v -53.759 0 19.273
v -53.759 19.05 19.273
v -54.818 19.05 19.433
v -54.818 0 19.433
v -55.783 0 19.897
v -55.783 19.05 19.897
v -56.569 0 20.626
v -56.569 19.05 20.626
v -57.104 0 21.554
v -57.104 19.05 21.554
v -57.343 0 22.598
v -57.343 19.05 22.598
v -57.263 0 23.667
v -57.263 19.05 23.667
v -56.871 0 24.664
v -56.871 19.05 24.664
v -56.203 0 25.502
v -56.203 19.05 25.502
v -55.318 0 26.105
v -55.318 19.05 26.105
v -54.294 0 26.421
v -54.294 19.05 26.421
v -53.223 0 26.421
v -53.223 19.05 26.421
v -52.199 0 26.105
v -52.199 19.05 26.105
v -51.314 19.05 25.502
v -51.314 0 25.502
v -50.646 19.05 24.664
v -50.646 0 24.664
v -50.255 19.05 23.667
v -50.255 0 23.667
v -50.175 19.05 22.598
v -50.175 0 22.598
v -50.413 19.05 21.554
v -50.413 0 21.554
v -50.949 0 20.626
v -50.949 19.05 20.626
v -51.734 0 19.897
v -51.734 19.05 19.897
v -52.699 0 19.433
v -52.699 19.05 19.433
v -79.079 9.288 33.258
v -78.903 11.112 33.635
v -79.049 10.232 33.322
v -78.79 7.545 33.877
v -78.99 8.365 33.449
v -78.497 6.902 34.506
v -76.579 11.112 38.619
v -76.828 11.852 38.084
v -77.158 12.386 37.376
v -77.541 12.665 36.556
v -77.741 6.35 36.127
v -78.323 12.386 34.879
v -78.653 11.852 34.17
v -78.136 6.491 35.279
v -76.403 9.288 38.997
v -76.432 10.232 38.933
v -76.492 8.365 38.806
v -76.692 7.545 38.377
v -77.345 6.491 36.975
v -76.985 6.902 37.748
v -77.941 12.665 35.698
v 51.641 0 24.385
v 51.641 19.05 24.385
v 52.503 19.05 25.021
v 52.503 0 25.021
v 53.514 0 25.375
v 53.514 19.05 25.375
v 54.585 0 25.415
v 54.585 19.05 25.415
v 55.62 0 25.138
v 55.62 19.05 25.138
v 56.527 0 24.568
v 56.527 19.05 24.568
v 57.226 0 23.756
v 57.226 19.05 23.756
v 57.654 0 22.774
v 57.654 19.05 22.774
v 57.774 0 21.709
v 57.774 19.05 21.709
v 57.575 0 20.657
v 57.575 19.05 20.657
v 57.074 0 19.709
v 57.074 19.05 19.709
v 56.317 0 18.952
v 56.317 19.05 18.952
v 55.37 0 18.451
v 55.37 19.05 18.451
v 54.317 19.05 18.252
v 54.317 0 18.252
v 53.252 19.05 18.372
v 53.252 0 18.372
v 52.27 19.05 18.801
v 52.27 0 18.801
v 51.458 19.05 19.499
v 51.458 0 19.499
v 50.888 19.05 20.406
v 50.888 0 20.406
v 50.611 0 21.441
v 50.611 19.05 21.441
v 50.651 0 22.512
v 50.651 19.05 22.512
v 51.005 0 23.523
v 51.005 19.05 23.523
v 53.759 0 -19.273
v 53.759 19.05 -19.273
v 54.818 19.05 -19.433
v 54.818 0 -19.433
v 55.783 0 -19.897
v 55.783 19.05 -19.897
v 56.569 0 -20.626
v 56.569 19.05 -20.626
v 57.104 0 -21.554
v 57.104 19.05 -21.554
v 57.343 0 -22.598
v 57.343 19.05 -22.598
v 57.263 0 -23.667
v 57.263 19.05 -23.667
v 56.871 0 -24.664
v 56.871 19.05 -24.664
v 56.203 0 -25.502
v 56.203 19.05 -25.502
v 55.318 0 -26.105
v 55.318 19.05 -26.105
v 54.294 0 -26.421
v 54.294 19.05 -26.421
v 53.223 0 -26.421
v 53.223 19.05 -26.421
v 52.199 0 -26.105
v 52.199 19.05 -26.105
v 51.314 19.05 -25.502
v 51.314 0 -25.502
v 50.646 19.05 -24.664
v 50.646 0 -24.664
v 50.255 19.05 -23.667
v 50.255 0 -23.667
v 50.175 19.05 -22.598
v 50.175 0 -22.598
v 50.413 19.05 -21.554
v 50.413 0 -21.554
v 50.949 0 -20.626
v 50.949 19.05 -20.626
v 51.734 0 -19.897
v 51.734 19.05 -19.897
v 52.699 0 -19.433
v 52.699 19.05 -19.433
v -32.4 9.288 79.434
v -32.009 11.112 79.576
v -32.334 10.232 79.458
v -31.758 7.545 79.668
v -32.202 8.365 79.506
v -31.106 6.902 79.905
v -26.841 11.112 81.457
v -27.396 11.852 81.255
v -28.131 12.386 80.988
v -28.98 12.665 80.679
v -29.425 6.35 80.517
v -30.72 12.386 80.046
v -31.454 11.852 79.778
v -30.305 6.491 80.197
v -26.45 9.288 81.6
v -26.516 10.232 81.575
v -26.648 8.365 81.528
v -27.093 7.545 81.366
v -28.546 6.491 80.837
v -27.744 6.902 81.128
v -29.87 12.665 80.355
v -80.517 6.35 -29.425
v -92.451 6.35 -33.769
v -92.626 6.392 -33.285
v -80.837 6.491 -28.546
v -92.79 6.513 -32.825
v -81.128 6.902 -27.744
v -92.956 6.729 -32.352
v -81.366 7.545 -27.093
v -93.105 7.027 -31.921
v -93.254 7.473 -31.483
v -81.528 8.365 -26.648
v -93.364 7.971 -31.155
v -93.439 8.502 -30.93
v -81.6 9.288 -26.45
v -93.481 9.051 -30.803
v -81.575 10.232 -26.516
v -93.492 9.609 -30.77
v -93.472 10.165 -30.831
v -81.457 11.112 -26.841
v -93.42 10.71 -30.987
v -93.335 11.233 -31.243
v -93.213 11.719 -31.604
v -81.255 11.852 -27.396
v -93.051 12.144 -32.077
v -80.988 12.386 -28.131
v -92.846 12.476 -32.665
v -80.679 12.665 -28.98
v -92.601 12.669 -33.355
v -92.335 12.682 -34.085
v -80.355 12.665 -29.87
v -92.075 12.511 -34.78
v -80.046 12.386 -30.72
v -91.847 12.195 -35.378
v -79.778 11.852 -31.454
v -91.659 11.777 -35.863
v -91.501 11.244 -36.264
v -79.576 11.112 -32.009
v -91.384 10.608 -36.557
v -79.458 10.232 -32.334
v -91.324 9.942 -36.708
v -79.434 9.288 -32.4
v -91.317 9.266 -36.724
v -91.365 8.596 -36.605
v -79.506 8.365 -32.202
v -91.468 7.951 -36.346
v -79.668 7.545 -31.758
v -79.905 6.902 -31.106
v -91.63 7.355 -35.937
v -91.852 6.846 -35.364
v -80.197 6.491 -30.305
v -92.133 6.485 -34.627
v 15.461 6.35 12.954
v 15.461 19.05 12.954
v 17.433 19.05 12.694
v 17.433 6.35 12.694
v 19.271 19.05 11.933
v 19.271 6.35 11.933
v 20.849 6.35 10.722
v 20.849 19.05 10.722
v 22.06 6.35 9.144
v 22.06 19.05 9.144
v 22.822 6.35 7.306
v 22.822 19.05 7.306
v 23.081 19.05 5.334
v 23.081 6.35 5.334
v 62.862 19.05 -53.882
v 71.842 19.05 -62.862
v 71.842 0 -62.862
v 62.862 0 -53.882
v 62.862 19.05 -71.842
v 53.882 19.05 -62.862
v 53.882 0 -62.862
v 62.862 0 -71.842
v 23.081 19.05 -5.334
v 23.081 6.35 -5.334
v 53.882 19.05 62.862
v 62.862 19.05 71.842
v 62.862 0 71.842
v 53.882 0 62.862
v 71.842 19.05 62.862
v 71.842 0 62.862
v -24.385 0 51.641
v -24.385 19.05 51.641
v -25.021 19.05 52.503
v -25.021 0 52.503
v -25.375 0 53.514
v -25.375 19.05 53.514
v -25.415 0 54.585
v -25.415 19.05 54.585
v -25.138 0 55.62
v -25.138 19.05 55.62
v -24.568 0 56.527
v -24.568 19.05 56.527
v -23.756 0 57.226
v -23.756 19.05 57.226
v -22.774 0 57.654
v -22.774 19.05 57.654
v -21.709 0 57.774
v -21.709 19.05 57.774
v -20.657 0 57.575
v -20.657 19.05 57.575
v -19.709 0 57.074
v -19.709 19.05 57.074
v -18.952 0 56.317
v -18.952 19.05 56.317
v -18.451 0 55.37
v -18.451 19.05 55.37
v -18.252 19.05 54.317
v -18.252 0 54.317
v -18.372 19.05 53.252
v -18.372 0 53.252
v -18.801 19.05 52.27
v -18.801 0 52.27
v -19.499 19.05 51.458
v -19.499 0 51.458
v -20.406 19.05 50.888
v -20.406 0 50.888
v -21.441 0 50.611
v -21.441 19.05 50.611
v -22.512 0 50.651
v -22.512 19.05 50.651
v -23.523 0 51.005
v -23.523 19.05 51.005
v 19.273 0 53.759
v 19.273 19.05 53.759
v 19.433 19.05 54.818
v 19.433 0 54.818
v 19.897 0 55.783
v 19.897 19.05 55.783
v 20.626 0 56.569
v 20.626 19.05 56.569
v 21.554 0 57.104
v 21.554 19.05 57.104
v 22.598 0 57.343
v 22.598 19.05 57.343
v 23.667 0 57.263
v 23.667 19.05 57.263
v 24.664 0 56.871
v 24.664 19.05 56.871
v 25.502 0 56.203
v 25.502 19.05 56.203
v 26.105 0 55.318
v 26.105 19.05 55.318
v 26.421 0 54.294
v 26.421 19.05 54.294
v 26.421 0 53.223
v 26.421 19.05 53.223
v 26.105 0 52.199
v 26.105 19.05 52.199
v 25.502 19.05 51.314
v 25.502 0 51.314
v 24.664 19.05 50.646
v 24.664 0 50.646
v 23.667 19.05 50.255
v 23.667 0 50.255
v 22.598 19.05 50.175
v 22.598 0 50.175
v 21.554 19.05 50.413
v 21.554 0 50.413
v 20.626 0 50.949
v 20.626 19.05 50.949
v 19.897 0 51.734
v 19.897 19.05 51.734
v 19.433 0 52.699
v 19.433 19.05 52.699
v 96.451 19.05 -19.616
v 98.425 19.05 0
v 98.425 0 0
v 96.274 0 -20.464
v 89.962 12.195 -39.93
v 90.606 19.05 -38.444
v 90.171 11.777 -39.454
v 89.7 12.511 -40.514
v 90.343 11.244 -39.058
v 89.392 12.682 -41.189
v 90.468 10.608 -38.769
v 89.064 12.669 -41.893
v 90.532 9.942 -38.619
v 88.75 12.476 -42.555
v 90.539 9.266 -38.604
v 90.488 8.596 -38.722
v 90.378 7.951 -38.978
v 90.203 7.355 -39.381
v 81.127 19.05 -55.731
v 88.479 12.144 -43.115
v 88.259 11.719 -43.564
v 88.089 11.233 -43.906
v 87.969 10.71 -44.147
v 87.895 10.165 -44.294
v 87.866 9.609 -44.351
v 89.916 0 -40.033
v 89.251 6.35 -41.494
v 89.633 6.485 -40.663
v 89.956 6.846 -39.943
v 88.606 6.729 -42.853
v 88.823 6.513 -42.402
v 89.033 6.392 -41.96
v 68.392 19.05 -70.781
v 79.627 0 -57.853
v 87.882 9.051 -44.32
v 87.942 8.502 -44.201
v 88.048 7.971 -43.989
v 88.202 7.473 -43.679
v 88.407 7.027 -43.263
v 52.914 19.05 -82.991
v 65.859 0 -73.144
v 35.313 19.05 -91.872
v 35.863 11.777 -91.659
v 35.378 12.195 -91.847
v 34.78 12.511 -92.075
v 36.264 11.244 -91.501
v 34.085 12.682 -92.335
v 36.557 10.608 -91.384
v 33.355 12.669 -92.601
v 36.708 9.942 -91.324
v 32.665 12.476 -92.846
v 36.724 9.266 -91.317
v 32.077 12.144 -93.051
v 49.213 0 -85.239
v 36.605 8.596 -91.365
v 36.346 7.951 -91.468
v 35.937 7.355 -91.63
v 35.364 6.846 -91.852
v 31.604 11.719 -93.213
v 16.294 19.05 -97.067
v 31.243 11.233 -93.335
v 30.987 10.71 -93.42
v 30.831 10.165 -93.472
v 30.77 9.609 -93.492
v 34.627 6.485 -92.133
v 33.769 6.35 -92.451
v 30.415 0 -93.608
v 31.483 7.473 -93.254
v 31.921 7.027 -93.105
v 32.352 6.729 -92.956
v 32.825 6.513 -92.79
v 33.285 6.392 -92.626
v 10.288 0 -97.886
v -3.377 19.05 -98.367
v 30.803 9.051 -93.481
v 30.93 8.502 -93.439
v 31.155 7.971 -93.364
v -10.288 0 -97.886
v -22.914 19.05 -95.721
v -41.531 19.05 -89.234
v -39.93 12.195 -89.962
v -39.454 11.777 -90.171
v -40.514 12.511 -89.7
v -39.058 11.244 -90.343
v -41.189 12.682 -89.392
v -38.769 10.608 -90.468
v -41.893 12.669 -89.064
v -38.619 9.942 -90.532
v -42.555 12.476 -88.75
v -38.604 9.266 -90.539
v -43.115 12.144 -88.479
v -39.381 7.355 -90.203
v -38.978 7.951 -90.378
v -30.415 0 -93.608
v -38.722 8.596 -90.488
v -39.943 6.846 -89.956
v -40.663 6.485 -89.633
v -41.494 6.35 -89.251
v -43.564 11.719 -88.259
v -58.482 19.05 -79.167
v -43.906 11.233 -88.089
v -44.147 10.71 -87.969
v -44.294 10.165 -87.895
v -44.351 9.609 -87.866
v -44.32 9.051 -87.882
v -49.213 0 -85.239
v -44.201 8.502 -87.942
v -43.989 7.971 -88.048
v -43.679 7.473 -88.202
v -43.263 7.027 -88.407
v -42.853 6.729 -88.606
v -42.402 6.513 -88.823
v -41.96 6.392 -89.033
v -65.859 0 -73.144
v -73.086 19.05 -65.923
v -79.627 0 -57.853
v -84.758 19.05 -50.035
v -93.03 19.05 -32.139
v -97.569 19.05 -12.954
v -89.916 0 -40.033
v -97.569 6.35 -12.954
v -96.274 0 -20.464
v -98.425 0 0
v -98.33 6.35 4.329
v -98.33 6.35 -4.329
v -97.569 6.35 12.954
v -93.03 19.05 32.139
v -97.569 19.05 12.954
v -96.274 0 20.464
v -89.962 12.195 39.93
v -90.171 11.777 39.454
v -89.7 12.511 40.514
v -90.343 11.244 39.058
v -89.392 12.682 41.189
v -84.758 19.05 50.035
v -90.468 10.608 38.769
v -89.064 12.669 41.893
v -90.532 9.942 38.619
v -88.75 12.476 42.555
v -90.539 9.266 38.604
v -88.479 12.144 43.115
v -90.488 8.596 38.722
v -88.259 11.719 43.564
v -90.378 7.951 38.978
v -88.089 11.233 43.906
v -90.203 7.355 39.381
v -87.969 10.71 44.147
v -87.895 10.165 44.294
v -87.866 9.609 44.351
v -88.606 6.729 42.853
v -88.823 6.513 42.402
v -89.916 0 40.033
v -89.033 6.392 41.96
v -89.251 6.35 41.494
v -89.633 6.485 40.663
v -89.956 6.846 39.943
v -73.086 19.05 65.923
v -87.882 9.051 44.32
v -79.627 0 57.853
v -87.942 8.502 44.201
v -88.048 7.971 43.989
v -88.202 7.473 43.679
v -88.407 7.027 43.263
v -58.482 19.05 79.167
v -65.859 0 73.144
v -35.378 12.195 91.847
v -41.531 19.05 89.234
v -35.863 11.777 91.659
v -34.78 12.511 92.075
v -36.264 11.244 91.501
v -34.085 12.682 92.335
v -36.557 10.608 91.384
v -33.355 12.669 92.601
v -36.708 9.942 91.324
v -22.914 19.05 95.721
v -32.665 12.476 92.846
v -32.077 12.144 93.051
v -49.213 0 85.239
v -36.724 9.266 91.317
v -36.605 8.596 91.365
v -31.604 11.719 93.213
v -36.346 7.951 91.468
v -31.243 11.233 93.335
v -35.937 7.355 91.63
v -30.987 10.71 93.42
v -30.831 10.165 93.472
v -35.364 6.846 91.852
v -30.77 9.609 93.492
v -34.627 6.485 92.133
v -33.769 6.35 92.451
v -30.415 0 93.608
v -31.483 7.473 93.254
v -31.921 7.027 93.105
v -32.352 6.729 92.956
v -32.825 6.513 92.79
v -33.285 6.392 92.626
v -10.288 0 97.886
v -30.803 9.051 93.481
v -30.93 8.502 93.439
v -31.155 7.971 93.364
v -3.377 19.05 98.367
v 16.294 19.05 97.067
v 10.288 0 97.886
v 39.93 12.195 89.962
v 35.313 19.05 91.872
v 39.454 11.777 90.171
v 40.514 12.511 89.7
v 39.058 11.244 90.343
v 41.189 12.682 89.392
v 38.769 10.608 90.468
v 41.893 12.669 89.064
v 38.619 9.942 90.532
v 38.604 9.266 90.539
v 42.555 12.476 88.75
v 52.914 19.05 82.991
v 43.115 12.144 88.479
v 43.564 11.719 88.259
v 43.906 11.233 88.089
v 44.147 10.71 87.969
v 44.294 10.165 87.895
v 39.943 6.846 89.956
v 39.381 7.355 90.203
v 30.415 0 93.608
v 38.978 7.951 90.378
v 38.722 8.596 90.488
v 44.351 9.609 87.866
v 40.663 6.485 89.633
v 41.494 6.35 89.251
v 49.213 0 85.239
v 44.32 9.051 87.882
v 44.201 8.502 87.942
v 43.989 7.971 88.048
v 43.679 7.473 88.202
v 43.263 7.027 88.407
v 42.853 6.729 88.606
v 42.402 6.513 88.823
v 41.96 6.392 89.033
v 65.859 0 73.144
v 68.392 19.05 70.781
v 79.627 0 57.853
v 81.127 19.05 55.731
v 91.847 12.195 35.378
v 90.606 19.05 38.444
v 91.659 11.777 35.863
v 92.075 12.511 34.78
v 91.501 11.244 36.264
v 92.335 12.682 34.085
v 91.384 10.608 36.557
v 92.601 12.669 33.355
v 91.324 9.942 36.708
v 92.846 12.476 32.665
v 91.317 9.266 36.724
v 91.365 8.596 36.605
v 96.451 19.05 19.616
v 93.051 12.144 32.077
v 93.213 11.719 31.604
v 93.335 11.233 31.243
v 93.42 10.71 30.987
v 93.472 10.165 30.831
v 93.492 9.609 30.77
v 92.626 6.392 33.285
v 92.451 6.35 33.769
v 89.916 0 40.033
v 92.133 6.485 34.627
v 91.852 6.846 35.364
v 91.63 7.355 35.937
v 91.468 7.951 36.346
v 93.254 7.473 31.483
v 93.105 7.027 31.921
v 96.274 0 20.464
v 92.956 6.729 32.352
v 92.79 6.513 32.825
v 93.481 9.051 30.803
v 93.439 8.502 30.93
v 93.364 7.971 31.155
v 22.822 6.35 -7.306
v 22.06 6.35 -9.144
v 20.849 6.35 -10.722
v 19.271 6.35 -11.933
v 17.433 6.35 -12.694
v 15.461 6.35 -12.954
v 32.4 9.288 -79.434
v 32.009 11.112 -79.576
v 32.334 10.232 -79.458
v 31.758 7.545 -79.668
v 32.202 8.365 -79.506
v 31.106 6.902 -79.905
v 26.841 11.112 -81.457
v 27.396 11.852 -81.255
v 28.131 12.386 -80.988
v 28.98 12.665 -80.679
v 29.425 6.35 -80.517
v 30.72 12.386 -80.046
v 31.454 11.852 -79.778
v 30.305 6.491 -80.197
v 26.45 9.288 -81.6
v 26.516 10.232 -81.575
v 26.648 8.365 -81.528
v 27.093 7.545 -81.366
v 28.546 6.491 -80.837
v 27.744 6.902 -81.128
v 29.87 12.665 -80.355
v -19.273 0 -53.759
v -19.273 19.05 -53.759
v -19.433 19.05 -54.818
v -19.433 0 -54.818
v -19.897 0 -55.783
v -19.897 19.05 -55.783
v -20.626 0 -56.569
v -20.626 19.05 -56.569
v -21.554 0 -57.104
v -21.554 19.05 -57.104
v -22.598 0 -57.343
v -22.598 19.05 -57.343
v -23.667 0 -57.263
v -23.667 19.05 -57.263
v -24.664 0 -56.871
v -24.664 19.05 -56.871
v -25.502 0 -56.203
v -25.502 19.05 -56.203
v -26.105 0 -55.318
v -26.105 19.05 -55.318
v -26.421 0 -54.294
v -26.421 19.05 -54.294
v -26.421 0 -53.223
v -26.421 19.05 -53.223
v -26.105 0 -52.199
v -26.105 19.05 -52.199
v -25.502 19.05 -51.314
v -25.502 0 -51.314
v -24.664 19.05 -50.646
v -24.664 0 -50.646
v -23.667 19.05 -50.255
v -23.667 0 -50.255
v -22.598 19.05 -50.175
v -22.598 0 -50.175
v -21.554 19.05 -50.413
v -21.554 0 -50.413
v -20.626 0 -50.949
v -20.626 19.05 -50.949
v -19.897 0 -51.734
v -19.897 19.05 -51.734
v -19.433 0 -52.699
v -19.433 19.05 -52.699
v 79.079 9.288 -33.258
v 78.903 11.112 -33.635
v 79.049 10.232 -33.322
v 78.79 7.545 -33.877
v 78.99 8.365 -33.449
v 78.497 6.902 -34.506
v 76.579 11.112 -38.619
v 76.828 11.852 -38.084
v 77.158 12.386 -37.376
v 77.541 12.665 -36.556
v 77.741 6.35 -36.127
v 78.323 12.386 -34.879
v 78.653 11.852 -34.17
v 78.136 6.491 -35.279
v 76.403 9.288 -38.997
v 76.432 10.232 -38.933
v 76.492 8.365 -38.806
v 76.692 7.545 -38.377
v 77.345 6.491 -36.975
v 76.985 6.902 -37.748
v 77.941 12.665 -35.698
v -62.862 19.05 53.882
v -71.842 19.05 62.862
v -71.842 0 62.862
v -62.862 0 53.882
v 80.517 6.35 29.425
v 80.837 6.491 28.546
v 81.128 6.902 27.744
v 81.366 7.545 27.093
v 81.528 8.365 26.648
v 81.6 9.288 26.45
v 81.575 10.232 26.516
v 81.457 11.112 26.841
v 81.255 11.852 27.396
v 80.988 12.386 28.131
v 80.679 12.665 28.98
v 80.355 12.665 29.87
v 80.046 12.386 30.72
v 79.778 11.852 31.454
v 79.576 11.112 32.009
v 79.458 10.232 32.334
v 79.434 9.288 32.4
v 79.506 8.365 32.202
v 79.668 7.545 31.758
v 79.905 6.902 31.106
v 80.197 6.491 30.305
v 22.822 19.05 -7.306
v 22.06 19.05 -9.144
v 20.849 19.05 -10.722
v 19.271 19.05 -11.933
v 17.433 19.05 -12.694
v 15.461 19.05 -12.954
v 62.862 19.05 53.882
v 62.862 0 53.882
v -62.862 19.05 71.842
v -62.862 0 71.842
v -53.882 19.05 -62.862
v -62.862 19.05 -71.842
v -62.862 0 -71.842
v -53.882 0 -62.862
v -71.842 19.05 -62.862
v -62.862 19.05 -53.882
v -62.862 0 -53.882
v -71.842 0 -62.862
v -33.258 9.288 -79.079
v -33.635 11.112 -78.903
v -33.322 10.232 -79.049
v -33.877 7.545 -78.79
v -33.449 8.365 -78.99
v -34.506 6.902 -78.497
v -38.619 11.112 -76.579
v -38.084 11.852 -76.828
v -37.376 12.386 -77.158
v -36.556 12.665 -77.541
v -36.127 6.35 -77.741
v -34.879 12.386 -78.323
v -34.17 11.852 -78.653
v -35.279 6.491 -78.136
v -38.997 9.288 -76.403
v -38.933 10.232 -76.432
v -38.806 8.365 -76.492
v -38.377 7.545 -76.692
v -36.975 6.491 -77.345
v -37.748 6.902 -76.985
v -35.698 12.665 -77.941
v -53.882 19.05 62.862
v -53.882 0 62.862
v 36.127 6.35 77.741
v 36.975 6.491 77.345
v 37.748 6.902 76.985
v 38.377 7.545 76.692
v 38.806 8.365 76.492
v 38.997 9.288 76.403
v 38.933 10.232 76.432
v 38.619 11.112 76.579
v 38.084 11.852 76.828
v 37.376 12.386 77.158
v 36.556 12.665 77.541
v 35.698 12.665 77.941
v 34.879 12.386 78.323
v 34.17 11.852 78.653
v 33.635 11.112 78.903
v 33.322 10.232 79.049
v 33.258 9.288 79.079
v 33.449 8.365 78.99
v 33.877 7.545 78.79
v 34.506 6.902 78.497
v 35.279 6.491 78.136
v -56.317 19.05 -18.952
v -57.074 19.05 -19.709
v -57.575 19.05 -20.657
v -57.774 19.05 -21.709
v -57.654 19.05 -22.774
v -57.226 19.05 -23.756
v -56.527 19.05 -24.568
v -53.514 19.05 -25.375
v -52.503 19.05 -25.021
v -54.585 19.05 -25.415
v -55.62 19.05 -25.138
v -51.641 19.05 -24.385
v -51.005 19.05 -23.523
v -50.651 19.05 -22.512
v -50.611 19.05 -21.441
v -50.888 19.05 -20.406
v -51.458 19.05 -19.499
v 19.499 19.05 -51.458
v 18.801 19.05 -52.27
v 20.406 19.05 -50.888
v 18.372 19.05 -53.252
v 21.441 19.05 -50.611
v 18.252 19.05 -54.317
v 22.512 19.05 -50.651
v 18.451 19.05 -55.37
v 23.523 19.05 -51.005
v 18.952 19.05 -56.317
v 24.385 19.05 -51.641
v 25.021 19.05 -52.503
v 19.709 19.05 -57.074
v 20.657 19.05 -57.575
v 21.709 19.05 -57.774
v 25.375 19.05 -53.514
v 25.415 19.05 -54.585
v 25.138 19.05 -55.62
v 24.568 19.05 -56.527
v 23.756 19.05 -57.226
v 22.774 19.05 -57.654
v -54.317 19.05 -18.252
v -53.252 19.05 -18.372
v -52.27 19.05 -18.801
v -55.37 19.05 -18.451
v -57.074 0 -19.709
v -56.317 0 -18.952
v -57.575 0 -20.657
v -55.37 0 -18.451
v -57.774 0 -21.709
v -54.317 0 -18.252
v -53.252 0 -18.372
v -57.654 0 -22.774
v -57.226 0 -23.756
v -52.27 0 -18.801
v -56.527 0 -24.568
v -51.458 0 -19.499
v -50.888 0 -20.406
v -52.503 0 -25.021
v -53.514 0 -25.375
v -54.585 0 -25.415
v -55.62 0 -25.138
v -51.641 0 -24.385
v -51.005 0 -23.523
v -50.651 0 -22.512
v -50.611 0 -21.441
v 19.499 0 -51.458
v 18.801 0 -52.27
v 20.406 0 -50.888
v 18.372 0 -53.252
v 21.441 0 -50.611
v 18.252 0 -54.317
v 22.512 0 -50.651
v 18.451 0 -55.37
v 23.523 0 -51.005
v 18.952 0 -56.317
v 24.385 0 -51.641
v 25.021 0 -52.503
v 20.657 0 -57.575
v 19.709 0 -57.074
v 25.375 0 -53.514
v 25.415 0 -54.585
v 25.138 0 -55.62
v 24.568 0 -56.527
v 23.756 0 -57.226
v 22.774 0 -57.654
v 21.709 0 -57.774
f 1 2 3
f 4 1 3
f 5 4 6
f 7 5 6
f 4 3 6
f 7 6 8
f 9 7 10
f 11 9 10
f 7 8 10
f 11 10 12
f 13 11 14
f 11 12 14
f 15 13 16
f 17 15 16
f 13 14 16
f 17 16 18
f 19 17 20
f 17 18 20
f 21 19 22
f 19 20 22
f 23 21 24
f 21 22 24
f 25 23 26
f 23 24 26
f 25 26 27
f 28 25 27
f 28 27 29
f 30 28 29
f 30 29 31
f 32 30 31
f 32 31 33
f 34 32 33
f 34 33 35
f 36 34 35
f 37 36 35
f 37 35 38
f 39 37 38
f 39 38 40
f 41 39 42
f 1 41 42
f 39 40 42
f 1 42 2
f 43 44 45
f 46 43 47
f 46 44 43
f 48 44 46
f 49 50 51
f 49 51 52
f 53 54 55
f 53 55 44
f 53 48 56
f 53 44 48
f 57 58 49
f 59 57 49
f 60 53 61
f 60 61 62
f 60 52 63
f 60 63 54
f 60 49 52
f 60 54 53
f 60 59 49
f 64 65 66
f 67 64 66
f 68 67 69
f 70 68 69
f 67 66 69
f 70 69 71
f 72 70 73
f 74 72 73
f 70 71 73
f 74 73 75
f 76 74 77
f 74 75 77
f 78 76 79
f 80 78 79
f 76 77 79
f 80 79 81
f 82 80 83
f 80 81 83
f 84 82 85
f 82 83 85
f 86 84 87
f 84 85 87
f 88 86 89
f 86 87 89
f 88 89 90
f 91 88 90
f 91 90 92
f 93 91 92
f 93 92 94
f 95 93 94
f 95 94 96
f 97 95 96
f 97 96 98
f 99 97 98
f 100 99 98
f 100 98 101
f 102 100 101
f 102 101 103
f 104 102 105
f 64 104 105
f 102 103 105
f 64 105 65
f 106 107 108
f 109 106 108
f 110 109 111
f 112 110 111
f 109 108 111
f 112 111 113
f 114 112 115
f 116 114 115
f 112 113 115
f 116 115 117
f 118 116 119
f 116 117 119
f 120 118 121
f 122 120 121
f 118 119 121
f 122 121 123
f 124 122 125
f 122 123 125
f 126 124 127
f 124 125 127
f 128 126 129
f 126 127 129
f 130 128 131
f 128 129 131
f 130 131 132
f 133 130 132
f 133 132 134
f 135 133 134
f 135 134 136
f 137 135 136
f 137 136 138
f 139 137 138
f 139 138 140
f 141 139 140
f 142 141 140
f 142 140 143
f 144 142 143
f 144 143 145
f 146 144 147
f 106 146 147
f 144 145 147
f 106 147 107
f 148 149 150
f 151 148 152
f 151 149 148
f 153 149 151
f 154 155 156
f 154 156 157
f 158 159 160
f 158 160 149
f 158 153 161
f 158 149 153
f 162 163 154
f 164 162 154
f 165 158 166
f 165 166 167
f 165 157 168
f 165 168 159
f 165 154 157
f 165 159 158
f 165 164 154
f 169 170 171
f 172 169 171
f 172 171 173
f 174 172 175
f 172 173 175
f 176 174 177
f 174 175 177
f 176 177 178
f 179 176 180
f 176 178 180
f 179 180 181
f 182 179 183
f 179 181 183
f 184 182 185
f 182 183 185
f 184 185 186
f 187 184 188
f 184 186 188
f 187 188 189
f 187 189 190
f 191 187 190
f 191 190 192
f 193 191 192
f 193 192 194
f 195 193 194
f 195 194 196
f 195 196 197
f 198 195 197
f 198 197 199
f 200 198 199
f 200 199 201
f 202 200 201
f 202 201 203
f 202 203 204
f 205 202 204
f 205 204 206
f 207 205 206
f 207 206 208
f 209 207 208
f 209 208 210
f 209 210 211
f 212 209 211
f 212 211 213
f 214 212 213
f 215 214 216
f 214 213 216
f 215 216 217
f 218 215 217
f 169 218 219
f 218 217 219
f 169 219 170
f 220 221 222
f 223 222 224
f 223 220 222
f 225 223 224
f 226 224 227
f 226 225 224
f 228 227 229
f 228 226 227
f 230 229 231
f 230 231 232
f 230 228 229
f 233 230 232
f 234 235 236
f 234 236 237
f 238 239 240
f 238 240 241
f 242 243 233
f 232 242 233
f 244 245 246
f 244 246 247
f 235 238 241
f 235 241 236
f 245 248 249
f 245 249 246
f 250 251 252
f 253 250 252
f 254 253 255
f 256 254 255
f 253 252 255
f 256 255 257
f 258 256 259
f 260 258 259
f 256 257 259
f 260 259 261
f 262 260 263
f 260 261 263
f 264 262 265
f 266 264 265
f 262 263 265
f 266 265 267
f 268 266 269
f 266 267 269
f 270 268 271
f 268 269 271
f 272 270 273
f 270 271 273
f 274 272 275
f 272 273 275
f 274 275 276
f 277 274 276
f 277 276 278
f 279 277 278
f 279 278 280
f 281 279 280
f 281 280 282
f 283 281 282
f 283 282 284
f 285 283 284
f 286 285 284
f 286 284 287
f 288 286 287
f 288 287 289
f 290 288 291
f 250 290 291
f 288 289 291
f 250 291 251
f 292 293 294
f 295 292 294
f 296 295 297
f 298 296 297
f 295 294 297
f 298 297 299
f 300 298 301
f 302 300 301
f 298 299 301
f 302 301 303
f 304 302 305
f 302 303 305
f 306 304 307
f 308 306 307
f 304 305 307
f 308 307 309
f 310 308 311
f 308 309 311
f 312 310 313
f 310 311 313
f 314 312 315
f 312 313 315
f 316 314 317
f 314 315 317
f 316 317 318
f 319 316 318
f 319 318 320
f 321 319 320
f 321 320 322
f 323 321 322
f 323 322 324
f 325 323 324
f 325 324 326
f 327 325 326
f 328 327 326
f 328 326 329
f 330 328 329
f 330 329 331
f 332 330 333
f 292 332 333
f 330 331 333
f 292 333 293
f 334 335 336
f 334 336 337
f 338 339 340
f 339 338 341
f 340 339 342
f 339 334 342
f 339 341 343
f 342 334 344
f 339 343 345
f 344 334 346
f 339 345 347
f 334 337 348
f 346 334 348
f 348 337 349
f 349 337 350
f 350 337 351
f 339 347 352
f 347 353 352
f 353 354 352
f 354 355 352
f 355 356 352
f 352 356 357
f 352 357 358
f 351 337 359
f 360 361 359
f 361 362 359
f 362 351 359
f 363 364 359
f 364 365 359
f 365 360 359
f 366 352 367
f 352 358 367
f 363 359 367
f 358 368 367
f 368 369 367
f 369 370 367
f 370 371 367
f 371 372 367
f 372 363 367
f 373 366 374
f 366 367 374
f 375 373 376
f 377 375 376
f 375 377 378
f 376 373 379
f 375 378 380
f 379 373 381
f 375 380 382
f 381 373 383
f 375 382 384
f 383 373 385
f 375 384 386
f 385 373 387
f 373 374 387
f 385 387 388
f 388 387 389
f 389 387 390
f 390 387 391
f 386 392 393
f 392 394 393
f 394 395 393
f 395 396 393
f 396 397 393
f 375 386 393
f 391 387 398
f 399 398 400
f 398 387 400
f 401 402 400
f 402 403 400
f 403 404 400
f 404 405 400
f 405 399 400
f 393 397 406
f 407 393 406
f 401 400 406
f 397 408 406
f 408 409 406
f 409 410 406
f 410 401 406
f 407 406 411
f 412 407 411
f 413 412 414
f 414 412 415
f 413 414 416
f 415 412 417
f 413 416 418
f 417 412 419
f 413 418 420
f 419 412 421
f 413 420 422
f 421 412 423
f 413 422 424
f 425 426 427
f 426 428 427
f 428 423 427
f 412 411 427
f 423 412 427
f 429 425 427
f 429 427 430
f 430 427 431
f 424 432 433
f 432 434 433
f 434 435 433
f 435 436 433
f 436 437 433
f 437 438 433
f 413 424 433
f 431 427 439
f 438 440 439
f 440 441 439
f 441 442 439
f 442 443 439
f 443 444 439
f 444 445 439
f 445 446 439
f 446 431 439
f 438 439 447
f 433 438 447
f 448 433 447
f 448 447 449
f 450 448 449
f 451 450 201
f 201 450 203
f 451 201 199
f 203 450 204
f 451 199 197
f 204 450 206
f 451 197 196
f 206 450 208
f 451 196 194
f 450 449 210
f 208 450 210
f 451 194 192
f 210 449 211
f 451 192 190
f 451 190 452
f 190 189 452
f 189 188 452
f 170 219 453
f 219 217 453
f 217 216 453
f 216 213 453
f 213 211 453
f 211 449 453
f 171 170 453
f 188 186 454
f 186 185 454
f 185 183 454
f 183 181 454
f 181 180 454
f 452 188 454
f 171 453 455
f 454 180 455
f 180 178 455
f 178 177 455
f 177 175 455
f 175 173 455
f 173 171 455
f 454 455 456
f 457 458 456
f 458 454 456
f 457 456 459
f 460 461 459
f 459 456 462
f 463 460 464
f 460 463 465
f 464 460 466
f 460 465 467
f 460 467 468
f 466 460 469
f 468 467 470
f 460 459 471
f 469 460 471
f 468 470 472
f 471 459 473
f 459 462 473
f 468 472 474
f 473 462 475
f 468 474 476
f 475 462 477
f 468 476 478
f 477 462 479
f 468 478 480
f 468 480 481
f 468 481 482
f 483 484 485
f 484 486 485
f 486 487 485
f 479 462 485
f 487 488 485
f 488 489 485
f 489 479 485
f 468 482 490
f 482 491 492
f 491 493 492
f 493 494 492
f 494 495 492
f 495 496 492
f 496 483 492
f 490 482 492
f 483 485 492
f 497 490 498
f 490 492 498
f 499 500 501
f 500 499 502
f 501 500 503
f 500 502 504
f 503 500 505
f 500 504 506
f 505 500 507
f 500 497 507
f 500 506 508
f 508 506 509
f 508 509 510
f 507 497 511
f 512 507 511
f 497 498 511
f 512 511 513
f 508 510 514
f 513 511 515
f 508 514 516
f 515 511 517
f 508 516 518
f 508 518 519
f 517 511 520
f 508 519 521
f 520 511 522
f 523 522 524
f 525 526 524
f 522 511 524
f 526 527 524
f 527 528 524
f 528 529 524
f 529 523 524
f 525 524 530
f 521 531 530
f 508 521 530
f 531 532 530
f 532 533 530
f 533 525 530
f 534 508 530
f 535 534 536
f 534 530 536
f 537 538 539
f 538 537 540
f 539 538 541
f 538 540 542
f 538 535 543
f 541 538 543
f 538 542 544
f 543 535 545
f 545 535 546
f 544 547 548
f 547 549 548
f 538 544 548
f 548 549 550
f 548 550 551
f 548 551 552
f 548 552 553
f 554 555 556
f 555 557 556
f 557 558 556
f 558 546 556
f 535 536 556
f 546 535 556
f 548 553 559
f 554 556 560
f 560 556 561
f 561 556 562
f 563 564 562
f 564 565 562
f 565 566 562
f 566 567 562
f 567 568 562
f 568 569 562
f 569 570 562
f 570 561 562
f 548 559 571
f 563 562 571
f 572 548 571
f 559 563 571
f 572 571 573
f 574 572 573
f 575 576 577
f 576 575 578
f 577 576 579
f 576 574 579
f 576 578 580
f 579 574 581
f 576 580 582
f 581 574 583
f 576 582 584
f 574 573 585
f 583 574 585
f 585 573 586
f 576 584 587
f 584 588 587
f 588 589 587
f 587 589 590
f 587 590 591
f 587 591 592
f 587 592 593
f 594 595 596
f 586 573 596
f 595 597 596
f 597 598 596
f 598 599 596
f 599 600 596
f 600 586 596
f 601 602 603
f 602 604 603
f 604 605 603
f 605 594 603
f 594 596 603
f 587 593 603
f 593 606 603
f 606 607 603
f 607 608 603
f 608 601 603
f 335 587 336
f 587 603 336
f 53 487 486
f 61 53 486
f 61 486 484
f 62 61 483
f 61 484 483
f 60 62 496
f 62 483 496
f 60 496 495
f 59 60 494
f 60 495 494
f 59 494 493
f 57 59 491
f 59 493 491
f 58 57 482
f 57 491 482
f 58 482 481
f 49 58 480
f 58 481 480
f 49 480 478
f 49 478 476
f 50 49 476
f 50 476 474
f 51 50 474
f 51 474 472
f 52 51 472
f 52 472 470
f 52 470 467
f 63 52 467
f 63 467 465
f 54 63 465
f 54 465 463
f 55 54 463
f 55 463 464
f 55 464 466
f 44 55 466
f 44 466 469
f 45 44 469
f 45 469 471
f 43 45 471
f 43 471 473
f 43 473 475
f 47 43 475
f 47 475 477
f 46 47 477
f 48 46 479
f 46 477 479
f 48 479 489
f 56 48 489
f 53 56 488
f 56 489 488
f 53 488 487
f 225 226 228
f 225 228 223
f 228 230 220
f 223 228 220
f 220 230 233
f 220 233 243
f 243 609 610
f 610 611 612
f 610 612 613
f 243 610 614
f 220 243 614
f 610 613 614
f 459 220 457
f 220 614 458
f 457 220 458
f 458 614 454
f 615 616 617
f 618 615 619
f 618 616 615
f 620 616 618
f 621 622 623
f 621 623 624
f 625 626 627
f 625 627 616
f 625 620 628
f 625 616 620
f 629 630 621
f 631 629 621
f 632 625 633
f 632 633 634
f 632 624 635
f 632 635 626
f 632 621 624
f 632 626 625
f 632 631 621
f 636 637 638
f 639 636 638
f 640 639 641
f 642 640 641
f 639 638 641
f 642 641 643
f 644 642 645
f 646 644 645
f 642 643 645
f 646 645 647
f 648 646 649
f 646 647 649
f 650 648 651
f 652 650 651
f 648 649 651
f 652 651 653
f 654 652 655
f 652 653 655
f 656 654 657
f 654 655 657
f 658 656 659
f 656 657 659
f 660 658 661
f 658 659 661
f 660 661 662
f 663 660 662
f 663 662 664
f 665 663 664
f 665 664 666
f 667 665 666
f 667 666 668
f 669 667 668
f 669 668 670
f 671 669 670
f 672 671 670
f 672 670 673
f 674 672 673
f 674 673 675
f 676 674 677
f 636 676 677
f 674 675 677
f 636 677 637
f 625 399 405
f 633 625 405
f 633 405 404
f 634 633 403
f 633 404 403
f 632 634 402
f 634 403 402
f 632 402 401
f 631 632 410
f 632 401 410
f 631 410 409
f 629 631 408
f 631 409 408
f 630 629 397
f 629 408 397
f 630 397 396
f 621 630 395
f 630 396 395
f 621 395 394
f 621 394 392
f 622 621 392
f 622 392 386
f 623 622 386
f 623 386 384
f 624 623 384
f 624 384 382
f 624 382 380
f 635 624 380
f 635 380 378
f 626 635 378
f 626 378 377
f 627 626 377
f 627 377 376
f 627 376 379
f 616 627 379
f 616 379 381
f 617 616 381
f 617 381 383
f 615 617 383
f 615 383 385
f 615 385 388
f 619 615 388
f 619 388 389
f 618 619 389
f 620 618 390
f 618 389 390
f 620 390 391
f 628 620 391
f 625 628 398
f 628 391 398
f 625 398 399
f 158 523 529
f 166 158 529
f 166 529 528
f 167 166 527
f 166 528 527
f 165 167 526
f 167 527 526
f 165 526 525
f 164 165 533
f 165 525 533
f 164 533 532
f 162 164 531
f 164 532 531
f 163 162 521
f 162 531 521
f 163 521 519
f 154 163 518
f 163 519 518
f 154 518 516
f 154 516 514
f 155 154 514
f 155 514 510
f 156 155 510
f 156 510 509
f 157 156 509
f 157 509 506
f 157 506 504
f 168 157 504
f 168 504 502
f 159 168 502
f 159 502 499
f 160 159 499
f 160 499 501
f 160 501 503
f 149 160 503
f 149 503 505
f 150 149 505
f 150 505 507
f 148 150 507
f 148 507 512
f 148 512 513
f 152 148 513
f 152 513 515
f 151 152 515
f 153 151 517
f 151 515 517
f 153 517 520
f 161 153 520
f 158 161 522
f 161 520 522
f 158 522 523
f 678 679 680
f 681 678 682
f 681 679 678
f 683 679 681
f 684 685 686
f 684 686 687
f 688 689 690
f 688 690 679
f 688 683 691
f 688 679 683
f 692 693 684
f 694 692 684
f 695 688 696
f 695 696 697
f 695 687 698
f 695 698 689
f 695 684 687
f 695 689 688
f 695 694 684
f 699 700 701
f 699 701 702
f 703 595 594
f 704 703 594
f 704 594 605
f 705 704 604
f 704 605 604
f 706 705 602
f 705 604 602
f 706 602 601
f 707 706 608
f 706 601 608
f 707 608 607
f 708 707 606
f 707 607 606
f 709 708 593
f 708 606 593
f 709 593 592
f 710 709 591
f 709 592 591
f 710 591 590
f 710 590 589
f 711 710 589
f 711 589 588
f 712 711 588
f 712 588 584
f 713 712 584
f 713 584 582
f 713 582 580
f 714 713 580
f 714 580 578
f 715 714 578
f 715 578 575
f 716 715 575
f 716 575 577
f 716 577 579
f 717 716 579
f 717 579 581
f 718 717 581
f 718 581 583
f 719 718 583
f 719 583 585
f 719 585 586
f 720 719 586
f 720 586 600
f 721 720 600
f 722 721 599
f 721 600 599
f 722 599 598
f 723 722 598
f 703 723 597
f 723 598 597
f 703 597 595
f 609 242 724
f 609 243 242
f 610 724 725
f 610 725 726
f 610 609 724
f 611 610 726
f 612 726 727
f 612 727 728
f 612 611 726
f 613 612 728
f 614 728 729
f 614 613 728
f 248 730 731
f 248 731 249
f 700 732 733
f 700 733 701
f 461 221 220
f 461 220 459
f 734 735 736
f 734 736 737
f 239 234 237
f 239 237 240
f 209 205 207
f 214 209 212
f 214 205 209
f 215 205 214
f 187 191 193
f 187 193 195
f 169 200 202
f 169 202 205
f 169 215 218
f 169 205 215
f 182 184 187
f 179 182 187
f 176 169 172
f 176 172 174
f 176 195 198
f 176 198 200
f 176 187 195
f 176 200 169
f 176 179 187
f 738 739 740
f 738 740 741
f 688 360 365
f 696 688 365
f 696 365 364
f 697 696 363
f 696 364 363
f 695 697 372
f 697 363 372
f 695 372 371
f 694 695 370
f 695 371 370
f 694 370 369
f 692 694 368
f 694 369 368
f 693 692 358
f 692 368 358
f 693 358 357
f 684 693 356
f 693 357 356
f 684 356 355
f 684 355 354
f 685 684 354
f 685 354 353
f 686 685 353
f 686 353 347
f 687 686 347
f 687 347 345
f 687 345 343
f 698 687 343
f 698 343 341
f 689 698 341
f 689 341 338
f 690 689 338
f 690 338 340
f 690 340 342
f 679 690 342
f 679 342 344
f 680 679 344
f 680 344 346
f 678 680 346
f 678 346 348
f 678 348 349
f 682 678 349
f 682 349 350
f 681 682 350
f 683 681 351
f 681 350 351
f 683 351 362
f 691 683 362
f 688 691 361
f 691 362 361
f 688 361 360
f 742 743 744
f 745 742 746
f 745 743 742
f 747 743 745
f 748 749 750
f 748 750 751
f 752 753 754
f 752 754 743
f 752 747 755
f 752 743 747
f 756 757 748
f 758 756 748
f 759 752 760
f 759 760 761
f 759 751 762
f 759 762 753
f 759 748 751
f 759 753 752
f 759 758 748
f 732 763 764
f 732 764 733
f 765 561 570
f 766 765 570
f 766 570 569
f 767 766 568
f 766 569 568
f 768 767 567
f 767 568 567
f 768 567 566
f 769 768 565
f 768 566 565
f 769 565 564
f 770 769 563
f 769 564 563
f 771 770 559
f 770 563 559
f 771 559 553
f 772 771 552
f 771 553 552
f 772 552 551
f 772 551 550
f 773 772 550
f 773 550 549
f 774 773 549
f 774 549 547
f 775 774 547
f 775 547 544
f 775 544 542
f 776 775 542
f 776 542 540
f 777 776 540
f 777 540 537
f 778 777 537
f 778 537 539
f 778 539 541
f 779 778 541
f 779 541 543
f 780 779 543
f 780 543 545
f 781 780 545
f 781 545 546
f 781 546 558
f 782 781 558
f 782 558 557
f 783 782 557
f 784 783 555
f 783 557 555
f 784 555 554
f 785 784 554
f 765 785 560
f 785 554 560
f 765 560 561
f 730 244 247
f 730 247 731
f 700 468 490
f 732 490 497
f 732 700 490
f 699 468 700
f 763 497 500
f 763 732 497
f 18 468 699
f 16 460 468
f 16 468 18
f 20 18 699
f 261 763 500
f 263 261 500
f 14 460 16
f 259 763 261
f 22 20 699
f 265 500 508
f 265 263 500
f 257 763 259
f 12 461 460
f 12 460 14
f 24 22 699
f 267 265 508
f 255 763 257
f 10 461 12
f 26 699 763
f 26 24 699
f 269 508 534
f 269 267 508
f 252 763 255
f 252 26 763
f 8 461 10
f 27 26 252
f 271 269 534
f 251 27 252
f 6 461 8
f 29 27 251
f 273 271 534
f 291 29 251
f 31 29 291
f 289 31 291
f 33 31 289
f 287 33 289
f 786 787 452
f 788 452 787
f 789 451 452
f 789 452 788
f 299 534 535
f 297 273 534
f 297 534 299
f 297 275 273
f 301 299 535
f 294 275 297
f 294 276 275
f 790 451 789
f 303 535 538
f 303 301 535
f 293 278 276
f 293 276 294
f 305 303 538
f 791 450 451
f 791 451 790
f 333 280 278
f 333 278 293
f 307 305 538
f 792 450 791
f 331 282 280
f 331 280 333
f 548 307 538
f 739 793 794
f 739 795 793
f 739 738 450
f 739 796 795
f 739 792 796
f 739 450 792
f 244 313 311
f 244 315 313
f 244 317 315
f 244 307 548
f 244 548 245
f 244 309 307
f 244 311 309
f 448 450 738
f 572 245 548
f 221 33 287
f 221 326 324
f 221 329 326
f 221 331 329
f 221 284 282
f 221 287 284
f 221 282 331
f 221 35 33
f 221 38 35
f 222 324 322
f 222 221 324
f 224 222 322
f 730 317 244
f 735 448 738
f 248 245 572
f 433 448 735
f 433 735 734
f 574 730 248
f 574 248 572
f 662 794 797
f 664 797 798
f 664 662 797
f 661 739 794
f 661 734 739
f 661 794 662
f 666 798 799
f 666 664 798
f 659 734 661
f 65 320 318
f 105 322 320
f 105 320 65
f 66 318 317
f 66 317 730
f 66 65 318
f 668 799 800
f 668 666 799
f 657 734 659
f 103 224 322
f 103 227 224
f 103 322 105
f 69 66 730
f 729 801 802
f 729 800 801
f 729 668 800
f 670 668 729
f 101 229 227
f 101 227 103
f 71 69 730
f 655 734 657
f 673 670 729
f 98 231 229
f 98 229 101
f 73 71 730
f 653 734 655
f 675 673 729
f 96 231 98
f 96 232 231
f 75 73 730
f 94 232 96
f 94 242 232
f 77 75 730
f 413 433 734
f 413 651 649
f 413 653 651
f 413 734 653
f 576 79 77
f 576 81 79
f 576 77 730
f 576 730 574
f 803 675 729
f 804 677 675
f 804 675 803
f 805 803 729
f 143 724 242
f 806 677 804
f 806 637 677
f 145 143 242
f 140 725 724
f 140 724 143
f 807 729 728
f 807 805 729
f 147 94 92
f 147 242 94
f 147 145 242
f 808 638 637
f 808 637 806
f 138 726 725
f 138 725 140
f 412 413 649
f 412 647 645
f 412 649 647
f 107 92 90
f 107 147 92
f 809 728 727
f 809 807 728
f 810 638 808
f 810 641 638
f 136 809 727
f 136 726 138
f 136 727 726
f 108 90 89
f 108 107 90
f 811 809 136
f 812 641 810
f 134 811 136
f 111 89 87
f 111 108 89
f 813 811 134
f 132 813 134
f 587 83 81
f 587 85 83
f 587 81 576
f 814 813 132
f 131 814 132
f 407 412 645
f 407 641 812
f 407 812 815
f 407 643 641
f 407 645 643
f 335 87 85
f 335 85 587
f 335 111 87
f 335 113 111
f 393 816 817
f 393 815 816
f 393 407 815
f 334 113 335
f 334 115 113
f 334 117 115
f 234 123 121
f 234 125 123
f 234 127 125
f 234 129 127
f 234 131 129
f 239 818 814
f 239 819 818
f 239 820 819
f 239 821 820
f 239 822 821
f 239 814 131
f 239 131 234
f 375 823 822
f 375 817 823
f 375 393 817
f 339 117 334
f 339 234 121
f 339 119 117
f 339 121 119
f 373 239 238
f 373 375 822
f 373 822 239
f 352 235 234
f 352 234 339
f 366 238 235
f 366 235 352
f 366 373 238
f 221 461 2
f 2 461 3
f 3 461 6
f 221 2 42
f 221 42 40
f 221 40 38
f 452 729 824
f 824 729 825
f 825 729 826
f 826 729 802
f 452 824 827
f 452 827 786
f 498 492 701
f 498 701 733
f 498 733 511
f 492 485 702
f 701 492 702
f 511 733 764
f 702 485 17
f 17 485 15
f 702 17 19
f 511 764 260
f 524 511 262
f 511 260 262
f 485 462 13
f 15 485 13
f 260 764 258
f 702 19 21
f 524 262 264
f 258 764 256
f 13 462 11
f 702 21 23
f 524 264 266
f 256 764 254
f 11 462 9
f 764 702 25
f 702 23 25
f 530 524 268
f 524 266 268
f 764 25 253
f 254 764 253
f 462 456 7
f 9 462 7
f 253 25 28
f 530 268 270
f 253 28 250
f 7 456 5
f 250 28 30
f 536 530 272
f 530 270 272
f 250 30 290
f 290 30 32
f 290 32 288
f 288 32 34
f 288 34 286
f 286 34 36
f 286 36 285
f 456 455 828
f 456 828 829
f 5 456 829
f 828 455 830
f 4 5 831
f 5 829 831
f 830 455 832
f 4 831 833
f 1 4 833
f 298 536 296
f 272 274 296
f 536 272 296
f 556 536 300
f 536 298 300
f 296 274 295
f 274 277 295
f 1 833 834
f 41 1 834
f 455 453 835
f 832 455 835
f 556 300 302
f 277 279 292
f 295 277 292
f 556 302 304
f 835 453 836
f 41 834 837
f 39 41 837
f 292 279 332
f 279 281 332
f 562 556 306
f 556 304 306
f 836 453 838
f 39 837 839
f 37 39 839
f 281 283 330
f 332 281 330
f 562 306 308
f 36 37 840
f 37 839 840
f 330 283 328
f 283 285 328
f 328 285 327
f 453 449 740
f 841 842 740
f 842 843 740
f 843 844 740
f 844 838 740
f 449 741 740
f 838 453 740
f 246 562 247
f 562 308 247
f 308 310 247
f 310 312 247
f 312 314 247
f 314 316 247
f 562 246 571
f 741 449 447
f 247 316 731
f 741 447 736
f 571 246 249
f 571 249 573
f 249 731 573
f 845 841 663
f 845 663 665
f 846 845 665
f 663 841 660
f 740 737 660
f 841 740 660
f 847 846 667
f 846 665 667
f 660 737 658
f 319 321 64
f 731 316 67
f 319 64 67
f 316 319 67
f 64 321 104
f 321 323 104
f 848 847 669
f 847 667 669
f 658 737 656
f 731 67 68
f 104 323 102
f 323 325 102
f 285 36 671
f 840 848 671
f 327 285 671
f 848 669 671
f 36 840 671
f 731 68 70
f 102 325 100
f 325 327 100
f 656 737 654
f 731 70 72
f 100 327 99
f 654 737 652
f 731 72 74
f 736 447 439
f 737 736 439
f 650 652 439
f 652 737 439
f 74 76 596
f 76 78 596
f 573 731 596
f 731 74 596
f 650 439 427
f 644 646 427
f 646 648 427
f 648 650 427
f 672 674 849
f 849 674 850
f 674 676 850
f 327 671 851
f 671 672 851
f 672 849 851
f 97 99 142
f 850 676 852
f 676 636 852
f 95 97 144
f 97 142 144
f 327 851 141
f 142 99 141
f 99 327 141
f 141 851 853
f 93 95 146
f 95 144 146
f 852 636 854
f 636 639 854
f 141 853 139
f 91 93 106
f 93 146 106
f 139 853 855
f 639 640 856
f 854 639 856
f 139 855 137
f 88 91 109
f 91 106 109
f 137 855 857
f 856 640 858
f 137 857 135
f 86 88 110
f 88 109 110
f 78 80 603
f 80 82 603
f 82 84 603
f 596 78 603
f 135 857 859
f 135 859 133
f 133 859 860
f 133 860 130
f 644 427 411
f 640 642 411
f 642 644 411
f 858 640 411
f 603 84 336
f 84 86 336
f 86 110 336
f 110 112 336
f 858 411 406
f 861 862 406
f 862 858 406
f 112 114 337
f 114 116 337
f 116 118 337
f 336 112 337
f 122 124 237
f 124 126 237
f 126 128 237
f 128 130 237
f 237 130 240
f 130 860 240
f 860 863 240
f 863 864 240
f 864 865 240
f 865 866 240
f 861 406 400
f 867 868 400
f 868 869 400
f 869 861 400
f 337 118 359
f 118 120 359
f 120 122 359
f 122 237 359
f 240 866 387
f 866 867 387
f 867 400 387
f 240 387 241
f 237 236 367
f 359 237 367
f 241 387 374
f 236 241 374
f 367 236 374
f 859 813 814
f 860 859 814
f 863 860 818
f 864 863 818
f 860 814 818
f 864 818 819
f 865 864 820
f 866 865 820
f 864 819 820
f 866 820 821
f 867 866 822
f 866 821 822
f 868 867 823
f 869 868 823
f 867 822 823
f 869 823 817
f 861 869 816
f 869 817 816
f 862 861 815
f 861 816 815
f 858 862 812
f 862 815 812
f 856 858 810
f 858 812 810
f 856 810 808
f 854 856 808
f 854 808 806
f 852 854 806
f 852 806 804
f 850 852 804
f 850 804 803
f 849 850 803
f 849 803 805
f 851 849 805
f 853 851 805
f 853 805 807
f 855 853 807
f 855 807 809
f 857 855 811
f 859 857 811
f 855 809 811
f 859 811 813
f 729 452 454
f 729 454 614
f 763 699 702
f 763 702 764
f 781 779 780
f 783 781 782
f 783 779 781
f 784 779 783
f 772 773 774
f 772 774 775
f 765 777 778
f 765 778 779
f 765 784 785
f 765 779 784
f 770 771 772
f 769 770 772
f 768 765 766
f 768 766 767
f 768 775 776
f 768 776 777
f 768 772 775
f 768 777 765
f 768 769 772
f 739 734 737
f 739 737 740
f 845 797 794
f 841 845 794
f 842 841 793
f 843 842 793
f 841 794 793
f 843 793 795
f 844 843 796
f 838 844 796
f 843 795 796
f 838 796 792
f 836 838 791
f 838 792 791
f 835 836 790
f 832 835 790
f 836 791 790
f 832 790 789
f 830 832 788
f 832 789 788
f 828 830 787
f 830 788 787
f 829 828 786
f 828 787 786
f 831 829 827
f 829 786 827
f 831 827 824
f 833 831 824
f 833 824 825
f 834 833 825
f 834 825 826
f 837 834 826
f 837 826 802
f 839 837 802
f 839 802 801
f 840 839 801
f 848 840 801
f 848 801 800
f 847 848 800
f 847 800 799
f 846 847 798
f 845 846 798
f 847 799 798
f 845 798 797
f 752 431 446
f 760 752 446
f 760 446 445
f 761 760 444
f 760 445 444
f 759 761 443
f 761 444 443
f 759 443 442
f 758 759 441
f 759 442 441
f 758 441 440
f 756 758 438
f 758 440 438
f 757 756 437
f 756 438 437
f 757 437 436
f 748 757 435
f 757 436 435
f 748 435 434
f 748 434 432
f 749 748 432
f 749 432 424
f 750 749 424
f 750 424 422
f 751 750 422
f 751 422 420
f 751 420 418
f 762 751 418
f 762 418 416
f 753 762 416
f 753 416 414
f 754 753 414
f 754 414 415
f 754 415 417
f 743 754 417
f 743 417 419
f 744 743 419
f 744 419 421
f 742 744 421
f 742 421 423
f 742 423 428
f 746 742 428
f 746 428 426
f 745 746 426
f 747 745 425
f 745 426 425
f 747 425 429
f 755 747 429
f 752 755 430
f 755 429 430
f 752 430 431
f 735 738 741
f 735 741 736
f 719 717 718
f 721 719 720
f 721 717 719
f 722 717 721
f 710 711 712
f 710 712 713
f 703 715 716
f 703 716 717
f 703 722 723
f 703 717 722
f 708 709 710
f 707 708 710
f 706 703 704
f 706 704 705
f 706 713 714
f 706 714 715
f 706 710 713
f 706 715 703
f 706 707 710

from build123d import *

# Parameters (mm, degrees)
SKETCH1_R           = 98.425
BOSS_EXTRUDE1_DEPTH = 19.05
SKETCH3_R           = 3.5941
CUT_EXTRUDE4_DEPTH  = 19.05
CIRPATTERN2_COUNT   = 8
CUT_EXTRUDE5_DEPTH  = 12.7
CUT_EXTRUDE7_DEPTH  = 19.05
CIRPATTERN4_COUNT   = 4
SKETCH5_R           = 3.175
CUT_EXTRUDE8_DEPTH  = 12.7
CIRPATTERN5_COUNT   = 8
FILLET1_R           = 7.62


with BuildPart() as part:
    # Sketch1 → Boss-Extrude1 (new body)
    with BuildSketch(Plane(origin=(0, 0, 0), x_dir=(1, 0, 0), z_dir=(0, 1, 0))):
        Circle(SKETCH1_R)
    extrude(amount=BOSS_EXTRUDE1_DEPTH)

    # Sketch3 → Cut-Extrude4 (cut)
    with BuildSketch(Plane(origin=(0, 19.05, 0), x_dir=(1, 0, 0), z_dir=(0, 1, 0))):
        with Locations((-22.866976578, 53.758699595)):
            Circle(SKETCH3_R)
    cut_extrude4 = extrude(amount=-CUT_EXTRUDE4_DEPTH, mode=Mode.SUBTRACT)

    # CirPattern2: Cut-Extrude4 ×8 about axis
    cirpattern2_axis = Axis((0, 0, 0), (0, 1, 0))
    for i in range(1, CIRPATTERN2_COUNT):
        add(cut_extrude4.rotate(cirpattern2_axis, i * 360 / CIRPATTERN2_COUNT), mode=Mode.SUBTRACT)

    # Sketch4 → Cut-Extrude5 (cut)
    with BuildSketch(Plane(origin=(0, 19.05, 0), x_dir=(1, 0, 0), z_dir=(0, 1, 0))):
        with BuildLine():
            Line((-97.568819348, 12.954), (23.081180652, 12.954))
            Line((23.081180652, 12.954), (23.081180652, -12.954))
            Line((23.081180652, -12.954), (-97.568819348, -12.954))
            ThreePointArc((-97.568819348, -12.954), (-98.425, 0), (-97.568819348, 12.954))
        make_face()
    extrude(amount=-CUT_EXTRUDE5_DEPTH, mode=Mode.SUBTRACT)

    # Sketch2 → Cut-Extrude7 (cut)
    with BuildSketch(Plane(origin=(0, 19.05, 0), x_dir=(1, 0, 0), z_dir=(0, 1, 0))):
        Polygon((53.881536726, 62.861792847), (62.861792847, 71.842048969), (71.842048969, 62.861792847), (62.861792847, 53.881536726), align=None)
    cut_extrude7 = extrude(amount=-CUT_EXTRUDE7_DEPTH, mode=Mode.SUBTRACT)

    # CirPattern4: Cut-Extrude7 ×4 about axis
    cirpattern4_axis = Axis((0, 0, 0), (0, 1, 0))
    for i in range(1, CIRPATTERN4_COUNT):
        add(cut_extrude7.rotate(cirpattern4_axis, i * 360 / CIRPATTERN4_COUNT), mode=Mode.SUBTRACT)

    # Sketch5 → Cut-Extrude8 (cut)
    with BuildSketch(Plane(origin=(-33.663332607, 0, 92.489246201), x_dir=(0, -1, 0), z_dir=(-0.342020143, 0, 0.939692621))):
        with Locations((-9.525, -0.112232827)):
            Circle(SKETCH5_R)
    cut_extrude8 = extrude(amount=-CUT_EXTRUDE8_DEPTH, mode=Mode.SUBTRACT)

    # CirPattern5: Cut-Extrude8 ×8 about axis
    cirpattern5_axis = Axis((0, 0, 0), (0, 1, 0))
    for i in range(1, CIRPATTERN5_COUNT):
        add(cut_extrude8.rotate(cirpattern5_axis, i * 360 / CIRPATTERN5_COUNT), mode=Mode.SUBTRACT)

    # Fillet1
    fillet1_edges = [part.edges().sort_by_distance(p)[0] for p in [
        (23.081180652, 12.7, -12.954),
        (23.081180652, 12.7, 12.954),
    ]]
    fillet(fillet1_edges, radius=FILLET1_R)


solid = part.part
